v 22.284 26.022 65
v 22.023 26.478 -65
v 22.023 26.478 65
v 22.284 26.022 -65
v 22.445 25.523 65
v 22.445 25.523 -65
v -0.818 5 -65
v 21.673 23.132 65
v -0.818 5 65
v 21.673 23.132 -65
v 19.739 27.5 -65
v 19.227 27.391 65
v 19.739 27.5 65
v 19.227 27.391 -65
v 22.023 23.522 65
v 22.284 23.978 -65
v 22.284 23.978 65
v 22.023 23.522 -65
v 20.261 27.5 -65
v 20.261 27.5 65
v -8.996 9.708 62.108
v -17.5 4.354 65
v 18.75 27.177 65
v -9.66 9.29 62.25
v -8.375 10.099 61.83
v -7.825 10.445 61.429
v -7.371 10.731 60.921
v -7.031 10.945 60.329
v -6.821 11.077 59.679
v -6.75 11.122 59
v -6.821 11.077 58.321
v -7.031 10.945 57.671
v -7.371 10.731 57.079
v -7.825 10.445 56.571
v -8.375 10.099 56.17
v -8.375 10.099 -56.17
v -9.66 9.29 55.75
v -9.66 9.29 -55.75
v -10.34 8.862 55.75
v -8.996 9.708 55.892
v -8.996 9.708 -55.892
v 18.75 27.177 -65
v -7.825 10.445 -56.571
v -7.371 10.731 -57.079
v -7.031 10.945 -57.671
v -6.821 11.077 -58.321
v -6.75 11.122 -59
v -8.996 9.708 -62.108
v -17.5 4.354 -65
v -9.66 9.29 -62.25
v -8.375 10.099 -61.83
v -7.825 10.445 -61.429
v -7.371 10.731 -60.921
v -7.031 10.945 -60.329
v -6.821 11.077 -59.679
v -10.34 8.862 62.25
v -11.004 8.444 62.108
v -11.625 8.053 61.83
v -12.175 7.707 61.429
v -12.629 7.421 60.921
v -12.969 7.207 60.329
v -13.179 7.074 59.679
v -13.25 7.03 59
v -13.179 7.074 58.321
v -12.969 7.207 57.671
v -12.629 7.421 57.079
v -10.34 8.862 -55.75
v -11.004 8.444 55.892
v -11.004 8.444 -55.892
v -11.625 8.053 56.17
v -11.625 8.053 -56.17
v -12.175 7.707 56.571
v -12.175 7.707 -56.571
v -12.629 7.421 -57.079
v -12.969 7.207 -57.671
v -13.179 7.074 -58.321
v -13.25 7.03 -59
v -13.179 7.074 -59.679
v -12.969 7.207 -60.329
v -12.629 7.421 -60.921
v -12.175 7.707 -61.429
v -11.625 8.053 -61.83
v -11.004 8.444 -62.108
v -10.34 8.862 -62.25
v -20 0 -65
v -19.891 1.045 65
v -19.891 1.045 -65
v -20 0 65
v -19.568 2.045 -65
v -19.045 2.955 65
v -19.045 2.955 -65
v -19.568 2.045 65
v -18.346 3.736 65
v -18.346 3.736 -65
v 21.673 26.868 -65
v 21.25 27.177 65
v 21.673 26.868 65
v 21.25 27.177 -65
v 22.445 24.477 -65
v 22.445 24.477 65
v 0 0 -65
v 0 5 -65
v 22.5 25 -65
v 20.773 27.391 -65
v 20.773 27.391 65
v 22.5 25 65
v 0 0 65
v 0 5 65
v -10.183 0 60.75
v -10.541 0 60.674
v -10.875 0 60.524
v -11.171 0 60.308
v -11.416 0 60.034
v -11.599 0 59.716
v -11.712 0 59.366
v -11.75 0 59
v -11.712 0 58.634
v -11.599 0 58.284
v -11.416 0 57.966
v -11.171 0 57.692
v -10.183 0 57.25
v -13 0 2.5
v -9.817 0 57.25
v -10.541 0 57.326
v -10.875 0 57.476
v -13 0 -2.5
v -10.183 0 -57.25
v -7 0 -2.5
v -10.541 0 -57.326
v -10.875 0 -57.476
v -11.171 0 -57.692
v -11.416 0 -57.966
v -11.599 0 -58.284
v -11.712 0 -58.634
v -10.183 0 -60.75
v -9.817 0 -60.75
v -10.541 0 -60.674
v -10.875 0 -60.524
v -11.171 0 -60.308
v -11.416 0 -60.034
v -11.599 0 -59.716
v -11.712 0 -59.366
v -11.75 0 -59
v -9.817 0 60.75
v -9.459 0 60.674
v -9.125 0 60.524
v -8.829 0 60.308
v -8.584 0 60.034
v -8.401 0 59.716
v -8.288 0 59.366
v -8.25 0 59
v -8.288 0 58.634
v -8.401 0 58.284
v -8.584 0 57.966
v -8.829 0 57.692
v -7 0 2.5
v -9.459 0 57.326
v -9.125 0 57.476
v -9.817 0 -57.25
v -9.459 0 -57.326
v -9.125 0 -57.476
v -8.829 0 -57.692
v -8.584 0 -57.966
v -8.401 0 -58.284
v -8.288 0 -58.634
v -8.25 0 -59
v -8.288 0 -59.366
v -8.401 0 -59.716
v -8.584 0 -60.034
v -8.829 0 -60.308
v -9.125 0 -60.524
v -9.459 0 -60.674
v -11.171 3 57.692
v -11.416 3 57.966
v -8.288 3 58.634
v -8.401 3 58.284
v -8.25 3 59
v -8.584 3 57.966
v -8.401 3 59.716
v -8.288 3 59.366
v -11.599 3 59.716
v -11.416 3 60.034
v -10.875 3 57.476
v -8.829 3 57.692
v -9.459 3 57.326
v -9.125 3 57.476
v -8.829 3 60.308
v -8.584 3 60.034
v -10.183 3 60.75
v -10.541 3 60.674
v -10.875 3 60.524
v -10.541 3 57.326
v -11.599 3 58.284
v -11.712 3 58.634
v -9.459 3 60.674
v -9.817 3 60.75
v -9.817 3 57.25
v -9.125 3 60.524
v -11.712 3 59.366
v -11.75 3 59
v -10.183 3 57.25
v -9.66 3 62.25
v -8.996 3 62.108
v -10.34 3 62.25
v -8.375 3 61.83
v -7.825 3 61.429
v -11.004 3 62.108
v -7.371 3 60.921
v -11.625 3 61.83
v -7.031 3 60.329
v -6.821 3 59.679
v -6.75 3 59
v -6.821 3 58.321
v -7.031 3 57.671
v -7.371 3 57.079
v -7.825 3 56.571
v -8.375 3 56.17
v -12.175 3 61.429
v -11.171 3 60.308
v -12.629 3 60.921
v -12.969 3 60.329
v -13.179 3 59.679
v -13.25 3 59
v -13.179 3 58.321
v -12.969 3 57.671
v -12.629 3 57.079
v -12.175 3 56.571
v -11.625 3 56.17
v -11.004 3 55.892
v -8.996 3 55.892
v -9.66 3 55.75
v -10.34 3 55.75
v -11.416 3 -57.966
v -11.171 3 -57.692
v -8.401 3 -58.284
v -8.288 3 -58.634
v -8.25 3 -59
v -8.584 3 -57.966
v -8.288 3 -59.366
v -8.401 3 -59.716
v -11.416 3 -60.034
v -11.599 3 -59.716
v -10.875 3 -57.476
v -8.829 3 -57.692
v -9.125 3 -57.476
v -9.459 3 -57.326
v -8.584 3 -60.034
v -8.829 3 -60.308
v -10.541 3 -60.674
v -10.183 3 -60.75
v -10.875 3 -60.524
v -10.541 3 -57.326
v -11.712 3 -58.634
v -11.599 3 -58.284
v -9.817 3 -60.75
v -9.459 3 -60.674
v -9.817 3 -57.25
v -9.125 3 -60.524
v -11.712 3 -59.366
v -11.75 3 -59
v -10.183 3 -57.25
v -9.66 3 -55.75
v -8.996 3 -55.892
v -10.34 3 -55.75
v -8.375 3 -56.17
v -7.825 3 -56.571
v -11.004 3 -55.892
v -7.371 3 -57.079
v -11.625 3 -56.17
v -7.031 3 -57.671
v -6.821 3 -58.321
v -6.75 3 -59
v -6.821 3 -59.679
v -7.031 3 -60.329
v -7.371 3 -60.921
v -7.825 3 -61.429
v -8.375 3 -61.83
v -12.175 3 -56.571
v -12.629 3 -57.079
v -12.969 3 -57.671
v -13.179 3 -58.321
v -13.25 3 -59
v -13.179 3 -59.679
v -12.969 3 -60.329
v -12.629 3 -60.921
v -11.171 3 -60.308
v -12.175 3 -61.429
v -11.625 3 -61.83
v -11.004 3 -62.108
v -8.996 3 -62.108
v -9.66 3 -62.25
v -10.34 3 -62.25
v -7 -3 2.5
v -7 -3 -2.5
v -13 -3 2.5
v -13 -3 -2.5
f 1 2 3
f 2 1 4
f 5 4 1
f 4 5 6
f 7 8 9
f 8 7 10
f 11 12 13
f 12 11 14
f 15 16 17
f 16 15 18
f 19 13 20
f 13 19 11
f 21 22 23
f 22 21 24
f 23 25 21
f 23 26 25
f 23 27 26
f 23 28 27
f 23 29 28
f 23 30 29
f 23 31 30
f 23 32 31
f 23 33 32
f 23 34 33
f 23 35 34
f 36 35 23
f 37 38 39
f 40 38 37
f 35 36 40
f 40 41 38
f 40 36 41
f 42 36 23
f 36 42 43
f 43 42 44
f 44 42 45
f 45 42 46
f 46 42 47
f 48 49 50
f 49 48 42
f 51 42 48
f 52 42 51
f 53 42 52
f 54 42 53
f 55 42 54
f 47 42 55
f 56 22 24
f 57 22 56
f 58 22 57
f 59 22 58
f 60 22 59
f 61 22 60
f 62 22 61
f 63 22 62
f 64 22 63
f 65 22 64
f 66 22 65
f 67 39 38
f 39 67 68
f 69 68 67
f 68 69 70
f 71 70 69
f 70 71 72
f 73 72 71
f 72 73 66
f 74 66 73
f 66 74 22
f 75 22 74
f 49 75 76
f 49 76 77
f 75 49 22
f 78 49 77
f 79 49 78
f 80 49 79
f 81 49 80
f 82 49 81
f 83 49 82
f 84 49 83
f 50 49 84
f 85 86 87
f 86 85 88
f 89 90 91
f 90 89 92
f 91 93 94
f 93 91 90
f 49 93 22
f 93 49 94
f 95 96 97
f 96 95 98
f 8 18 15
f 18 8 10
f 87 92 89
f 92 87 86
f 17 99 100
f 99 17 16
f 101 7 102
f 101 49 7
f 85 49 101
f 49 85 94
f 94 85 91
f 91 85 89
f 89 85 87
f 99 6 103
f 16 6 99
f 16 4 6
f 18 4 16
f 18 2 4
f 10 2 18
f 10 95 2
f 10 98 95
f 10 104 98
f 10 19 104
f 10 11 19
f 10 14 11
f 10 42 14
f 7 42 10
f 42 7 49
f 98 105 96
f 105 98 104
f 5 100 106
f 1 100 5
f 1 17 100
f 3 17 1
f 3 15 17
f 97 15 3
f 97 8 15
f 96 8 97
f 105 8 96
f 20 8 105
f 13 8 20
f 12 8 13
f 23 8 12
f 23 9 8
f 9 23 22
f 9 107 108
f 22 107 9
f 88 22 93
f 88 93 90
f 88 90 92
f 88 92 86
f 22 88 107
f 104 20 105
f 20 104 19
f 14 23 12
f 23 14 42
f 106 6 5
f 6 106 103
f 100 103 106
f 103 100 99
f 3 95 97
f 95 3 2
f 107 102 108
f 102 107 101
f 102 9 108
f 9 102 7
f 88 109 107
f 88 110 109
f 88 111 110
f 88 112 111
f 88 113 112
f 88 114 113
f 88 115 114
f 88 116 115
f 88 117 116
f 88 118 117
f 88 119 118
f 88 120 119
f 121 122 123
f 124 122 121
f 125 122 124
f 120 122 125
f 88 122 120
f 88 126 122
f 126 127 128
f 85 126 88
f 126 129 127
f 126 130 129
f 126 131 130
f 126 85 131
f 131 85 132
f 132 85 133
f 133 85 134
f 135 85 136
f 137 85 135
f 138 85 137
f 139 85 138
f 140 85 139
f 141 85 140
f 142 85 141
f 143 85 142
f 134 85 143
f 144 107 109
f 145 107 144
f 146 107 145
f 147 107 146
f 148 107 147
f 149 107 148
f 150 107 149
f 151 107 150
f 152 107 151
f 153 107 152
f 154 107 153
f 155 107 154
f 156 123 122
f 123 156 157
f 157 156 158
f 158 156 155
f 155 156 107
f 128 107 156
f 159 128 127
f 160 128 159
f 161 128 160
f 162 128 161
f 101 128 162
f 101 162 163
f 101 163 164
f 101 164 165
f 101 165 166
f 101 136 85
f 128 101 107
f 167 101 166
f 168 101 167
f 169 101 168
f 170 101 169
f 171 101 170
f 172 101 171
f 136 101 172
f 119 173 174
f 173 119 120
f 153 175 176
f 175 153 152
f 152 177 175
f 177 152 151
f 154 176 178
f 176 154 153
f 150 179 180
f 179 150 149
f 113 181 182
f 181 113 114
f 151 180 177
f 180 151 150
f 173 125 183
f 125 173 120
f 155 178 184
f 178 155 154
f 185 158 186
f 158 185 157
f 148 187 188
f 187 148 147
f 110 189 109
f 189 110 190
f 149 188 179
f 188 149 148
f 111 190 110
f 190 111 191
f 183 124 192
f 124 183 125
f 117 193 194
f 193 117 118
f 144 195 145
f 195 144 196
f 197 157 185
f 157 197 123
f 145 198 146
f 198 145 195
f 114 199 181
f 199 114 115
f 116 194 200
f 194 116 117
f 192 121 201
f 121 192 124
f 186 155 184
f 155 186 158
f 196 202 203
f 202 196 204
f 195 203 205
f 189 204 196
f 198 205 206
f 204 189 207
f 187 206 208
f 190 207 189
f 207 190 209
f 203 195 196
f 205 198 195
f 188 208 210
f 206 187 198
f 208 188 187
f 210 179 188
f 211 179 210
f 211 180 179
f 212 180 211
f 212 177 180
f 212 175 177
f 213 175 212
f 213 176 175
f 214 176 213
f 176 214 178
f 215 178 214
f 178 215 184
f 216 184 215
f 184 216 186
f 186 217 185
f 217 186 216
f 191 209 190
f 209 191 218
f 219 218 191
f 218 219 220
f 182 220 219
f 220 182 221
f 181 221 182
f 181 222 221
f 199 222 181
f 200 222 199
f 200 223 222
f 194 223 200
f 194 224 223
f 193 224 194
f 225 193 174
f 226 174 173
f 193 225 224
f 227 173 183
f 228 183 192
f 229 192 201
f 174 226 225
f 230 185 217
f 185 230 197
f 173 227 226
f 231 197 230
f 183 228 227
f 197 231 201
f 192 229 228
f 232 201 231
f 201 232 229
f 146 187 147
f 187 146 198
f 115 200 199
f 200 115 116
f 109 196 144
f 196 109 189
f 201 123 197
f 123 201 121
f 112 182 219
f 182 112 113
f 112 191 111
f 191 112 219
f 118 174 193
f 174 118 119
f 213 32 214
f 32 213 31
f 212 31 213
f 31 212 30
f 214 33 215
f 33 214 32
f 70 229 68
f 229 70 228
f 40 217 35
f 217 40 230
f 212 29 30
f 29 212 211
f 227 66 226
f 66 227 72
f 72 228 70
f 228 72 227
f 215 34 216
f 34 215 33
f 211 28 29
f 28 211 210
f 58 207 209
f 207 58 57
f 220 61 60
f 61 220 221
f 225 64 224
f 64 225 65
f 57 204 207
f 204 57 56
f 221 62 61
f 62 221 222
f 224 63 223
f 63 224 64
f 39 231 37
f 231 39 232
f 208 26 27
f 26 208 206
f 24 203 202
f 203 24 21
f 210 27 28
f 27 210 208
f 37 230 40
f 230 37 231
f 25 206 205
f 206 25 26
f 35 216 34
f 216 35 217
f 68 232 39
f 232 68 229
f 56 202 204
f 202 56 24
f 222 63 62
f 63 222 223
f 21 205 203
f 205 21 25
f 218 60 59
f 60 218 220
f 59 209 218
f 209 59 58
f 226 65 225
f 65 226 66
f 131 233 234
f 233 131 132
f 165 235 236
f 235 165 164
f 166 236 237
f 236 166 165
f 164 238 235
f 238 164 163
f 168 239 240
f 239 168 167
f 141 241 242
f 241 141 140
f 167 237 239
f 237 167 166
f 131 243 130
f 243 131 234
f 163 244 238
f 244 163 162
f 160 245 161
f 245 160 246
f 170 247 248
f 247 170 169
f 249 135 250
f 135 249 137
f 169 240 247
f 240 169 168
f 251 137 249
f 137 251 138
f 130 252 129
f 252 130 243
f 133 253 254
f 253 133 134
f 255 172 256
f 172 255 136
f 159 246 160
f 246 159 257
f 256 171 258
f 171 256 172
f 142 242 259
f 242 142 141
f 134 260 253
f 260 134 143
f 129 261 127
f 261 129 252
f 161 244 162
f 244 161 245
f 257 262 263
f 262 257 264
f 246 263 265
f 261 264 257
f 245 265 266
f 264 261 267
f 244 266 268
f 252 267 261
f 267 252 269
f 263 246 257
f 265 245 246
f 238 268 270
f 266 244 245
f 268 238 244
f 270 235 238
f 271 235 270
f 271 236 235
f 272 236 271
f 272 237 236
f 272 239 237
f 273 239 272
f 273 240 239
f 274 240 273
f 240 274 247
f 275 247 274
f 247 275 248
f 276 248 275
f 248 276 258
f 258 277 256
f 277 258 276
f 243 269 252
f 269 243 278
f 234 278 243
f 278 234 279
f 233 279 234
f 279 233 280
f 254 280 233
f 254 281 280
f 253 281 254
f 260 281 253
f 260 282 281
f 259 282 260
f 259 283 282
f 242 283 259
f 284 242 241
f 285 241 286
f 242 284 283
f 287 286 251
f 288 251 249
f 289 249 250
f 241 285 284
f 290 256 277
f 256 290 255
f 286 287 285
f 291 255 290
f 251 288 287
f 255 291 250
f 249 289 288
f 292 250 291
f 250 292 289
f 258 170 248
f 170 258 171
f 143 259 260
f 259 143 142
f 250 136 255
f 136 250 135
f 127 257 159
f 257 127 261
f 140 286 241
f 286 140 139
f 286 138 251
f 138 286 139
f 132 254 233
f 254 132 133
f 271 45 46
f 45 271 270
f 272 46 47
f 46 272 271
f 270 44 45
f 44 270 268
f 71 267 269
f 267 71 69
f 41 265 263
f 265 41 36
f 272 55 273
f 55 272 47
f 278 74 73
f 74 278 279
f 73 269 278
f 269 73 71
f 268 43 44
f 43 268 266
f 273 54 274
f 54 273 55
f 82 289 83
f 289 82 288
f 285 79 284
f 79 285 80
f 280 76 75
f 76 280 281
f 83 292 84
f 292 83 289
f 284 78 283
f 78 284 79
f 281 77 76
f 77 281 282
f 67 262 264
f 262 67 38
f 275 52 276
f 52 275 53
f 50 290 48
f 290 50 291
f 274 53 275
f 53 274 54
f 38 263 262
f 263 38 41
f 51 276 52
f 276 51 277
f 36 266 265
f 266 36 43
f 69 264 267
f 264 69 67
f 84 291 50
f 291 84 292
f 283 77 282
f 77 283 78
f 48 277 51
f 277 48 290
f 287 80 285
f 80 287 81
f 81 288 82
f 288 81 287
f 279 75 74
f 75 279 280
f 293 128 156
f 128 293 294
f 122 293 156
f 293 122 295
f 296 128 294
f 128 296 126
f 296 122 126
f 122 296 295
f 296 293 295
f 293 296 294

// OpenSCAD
include <../../lib/relativity.scad/relativity.scad> // https://github.com/davidson16807/relativity.scad

height = 130;
screw_hole_position = 6;
t = 5;
$fn = 30;

differed("cut", "not(cut)") {
  hulled(class="h") 
  {
    box([15,t,height], anchor=x-y);
    translated(20*x+25*y) rod(d=5, h=height, $class="h");
    translated((t-20)*x) rod(r=t, h=height, $class="h");
  }
  box([20,t,height], anchor=x+y, $class="cut");
  mirrored(z)
  color("red") translated(-10*x+(height/2-screw_hole_position)*z) rotated(-90*x) 
    rod(d=3.5, h=3, anchor=-z, $class="cut") align(top) rod(d=6.5, h=20, anchor=-z, $class="cut");
}

translated(-10*x) box([6, 3, 5], anchor=y);
